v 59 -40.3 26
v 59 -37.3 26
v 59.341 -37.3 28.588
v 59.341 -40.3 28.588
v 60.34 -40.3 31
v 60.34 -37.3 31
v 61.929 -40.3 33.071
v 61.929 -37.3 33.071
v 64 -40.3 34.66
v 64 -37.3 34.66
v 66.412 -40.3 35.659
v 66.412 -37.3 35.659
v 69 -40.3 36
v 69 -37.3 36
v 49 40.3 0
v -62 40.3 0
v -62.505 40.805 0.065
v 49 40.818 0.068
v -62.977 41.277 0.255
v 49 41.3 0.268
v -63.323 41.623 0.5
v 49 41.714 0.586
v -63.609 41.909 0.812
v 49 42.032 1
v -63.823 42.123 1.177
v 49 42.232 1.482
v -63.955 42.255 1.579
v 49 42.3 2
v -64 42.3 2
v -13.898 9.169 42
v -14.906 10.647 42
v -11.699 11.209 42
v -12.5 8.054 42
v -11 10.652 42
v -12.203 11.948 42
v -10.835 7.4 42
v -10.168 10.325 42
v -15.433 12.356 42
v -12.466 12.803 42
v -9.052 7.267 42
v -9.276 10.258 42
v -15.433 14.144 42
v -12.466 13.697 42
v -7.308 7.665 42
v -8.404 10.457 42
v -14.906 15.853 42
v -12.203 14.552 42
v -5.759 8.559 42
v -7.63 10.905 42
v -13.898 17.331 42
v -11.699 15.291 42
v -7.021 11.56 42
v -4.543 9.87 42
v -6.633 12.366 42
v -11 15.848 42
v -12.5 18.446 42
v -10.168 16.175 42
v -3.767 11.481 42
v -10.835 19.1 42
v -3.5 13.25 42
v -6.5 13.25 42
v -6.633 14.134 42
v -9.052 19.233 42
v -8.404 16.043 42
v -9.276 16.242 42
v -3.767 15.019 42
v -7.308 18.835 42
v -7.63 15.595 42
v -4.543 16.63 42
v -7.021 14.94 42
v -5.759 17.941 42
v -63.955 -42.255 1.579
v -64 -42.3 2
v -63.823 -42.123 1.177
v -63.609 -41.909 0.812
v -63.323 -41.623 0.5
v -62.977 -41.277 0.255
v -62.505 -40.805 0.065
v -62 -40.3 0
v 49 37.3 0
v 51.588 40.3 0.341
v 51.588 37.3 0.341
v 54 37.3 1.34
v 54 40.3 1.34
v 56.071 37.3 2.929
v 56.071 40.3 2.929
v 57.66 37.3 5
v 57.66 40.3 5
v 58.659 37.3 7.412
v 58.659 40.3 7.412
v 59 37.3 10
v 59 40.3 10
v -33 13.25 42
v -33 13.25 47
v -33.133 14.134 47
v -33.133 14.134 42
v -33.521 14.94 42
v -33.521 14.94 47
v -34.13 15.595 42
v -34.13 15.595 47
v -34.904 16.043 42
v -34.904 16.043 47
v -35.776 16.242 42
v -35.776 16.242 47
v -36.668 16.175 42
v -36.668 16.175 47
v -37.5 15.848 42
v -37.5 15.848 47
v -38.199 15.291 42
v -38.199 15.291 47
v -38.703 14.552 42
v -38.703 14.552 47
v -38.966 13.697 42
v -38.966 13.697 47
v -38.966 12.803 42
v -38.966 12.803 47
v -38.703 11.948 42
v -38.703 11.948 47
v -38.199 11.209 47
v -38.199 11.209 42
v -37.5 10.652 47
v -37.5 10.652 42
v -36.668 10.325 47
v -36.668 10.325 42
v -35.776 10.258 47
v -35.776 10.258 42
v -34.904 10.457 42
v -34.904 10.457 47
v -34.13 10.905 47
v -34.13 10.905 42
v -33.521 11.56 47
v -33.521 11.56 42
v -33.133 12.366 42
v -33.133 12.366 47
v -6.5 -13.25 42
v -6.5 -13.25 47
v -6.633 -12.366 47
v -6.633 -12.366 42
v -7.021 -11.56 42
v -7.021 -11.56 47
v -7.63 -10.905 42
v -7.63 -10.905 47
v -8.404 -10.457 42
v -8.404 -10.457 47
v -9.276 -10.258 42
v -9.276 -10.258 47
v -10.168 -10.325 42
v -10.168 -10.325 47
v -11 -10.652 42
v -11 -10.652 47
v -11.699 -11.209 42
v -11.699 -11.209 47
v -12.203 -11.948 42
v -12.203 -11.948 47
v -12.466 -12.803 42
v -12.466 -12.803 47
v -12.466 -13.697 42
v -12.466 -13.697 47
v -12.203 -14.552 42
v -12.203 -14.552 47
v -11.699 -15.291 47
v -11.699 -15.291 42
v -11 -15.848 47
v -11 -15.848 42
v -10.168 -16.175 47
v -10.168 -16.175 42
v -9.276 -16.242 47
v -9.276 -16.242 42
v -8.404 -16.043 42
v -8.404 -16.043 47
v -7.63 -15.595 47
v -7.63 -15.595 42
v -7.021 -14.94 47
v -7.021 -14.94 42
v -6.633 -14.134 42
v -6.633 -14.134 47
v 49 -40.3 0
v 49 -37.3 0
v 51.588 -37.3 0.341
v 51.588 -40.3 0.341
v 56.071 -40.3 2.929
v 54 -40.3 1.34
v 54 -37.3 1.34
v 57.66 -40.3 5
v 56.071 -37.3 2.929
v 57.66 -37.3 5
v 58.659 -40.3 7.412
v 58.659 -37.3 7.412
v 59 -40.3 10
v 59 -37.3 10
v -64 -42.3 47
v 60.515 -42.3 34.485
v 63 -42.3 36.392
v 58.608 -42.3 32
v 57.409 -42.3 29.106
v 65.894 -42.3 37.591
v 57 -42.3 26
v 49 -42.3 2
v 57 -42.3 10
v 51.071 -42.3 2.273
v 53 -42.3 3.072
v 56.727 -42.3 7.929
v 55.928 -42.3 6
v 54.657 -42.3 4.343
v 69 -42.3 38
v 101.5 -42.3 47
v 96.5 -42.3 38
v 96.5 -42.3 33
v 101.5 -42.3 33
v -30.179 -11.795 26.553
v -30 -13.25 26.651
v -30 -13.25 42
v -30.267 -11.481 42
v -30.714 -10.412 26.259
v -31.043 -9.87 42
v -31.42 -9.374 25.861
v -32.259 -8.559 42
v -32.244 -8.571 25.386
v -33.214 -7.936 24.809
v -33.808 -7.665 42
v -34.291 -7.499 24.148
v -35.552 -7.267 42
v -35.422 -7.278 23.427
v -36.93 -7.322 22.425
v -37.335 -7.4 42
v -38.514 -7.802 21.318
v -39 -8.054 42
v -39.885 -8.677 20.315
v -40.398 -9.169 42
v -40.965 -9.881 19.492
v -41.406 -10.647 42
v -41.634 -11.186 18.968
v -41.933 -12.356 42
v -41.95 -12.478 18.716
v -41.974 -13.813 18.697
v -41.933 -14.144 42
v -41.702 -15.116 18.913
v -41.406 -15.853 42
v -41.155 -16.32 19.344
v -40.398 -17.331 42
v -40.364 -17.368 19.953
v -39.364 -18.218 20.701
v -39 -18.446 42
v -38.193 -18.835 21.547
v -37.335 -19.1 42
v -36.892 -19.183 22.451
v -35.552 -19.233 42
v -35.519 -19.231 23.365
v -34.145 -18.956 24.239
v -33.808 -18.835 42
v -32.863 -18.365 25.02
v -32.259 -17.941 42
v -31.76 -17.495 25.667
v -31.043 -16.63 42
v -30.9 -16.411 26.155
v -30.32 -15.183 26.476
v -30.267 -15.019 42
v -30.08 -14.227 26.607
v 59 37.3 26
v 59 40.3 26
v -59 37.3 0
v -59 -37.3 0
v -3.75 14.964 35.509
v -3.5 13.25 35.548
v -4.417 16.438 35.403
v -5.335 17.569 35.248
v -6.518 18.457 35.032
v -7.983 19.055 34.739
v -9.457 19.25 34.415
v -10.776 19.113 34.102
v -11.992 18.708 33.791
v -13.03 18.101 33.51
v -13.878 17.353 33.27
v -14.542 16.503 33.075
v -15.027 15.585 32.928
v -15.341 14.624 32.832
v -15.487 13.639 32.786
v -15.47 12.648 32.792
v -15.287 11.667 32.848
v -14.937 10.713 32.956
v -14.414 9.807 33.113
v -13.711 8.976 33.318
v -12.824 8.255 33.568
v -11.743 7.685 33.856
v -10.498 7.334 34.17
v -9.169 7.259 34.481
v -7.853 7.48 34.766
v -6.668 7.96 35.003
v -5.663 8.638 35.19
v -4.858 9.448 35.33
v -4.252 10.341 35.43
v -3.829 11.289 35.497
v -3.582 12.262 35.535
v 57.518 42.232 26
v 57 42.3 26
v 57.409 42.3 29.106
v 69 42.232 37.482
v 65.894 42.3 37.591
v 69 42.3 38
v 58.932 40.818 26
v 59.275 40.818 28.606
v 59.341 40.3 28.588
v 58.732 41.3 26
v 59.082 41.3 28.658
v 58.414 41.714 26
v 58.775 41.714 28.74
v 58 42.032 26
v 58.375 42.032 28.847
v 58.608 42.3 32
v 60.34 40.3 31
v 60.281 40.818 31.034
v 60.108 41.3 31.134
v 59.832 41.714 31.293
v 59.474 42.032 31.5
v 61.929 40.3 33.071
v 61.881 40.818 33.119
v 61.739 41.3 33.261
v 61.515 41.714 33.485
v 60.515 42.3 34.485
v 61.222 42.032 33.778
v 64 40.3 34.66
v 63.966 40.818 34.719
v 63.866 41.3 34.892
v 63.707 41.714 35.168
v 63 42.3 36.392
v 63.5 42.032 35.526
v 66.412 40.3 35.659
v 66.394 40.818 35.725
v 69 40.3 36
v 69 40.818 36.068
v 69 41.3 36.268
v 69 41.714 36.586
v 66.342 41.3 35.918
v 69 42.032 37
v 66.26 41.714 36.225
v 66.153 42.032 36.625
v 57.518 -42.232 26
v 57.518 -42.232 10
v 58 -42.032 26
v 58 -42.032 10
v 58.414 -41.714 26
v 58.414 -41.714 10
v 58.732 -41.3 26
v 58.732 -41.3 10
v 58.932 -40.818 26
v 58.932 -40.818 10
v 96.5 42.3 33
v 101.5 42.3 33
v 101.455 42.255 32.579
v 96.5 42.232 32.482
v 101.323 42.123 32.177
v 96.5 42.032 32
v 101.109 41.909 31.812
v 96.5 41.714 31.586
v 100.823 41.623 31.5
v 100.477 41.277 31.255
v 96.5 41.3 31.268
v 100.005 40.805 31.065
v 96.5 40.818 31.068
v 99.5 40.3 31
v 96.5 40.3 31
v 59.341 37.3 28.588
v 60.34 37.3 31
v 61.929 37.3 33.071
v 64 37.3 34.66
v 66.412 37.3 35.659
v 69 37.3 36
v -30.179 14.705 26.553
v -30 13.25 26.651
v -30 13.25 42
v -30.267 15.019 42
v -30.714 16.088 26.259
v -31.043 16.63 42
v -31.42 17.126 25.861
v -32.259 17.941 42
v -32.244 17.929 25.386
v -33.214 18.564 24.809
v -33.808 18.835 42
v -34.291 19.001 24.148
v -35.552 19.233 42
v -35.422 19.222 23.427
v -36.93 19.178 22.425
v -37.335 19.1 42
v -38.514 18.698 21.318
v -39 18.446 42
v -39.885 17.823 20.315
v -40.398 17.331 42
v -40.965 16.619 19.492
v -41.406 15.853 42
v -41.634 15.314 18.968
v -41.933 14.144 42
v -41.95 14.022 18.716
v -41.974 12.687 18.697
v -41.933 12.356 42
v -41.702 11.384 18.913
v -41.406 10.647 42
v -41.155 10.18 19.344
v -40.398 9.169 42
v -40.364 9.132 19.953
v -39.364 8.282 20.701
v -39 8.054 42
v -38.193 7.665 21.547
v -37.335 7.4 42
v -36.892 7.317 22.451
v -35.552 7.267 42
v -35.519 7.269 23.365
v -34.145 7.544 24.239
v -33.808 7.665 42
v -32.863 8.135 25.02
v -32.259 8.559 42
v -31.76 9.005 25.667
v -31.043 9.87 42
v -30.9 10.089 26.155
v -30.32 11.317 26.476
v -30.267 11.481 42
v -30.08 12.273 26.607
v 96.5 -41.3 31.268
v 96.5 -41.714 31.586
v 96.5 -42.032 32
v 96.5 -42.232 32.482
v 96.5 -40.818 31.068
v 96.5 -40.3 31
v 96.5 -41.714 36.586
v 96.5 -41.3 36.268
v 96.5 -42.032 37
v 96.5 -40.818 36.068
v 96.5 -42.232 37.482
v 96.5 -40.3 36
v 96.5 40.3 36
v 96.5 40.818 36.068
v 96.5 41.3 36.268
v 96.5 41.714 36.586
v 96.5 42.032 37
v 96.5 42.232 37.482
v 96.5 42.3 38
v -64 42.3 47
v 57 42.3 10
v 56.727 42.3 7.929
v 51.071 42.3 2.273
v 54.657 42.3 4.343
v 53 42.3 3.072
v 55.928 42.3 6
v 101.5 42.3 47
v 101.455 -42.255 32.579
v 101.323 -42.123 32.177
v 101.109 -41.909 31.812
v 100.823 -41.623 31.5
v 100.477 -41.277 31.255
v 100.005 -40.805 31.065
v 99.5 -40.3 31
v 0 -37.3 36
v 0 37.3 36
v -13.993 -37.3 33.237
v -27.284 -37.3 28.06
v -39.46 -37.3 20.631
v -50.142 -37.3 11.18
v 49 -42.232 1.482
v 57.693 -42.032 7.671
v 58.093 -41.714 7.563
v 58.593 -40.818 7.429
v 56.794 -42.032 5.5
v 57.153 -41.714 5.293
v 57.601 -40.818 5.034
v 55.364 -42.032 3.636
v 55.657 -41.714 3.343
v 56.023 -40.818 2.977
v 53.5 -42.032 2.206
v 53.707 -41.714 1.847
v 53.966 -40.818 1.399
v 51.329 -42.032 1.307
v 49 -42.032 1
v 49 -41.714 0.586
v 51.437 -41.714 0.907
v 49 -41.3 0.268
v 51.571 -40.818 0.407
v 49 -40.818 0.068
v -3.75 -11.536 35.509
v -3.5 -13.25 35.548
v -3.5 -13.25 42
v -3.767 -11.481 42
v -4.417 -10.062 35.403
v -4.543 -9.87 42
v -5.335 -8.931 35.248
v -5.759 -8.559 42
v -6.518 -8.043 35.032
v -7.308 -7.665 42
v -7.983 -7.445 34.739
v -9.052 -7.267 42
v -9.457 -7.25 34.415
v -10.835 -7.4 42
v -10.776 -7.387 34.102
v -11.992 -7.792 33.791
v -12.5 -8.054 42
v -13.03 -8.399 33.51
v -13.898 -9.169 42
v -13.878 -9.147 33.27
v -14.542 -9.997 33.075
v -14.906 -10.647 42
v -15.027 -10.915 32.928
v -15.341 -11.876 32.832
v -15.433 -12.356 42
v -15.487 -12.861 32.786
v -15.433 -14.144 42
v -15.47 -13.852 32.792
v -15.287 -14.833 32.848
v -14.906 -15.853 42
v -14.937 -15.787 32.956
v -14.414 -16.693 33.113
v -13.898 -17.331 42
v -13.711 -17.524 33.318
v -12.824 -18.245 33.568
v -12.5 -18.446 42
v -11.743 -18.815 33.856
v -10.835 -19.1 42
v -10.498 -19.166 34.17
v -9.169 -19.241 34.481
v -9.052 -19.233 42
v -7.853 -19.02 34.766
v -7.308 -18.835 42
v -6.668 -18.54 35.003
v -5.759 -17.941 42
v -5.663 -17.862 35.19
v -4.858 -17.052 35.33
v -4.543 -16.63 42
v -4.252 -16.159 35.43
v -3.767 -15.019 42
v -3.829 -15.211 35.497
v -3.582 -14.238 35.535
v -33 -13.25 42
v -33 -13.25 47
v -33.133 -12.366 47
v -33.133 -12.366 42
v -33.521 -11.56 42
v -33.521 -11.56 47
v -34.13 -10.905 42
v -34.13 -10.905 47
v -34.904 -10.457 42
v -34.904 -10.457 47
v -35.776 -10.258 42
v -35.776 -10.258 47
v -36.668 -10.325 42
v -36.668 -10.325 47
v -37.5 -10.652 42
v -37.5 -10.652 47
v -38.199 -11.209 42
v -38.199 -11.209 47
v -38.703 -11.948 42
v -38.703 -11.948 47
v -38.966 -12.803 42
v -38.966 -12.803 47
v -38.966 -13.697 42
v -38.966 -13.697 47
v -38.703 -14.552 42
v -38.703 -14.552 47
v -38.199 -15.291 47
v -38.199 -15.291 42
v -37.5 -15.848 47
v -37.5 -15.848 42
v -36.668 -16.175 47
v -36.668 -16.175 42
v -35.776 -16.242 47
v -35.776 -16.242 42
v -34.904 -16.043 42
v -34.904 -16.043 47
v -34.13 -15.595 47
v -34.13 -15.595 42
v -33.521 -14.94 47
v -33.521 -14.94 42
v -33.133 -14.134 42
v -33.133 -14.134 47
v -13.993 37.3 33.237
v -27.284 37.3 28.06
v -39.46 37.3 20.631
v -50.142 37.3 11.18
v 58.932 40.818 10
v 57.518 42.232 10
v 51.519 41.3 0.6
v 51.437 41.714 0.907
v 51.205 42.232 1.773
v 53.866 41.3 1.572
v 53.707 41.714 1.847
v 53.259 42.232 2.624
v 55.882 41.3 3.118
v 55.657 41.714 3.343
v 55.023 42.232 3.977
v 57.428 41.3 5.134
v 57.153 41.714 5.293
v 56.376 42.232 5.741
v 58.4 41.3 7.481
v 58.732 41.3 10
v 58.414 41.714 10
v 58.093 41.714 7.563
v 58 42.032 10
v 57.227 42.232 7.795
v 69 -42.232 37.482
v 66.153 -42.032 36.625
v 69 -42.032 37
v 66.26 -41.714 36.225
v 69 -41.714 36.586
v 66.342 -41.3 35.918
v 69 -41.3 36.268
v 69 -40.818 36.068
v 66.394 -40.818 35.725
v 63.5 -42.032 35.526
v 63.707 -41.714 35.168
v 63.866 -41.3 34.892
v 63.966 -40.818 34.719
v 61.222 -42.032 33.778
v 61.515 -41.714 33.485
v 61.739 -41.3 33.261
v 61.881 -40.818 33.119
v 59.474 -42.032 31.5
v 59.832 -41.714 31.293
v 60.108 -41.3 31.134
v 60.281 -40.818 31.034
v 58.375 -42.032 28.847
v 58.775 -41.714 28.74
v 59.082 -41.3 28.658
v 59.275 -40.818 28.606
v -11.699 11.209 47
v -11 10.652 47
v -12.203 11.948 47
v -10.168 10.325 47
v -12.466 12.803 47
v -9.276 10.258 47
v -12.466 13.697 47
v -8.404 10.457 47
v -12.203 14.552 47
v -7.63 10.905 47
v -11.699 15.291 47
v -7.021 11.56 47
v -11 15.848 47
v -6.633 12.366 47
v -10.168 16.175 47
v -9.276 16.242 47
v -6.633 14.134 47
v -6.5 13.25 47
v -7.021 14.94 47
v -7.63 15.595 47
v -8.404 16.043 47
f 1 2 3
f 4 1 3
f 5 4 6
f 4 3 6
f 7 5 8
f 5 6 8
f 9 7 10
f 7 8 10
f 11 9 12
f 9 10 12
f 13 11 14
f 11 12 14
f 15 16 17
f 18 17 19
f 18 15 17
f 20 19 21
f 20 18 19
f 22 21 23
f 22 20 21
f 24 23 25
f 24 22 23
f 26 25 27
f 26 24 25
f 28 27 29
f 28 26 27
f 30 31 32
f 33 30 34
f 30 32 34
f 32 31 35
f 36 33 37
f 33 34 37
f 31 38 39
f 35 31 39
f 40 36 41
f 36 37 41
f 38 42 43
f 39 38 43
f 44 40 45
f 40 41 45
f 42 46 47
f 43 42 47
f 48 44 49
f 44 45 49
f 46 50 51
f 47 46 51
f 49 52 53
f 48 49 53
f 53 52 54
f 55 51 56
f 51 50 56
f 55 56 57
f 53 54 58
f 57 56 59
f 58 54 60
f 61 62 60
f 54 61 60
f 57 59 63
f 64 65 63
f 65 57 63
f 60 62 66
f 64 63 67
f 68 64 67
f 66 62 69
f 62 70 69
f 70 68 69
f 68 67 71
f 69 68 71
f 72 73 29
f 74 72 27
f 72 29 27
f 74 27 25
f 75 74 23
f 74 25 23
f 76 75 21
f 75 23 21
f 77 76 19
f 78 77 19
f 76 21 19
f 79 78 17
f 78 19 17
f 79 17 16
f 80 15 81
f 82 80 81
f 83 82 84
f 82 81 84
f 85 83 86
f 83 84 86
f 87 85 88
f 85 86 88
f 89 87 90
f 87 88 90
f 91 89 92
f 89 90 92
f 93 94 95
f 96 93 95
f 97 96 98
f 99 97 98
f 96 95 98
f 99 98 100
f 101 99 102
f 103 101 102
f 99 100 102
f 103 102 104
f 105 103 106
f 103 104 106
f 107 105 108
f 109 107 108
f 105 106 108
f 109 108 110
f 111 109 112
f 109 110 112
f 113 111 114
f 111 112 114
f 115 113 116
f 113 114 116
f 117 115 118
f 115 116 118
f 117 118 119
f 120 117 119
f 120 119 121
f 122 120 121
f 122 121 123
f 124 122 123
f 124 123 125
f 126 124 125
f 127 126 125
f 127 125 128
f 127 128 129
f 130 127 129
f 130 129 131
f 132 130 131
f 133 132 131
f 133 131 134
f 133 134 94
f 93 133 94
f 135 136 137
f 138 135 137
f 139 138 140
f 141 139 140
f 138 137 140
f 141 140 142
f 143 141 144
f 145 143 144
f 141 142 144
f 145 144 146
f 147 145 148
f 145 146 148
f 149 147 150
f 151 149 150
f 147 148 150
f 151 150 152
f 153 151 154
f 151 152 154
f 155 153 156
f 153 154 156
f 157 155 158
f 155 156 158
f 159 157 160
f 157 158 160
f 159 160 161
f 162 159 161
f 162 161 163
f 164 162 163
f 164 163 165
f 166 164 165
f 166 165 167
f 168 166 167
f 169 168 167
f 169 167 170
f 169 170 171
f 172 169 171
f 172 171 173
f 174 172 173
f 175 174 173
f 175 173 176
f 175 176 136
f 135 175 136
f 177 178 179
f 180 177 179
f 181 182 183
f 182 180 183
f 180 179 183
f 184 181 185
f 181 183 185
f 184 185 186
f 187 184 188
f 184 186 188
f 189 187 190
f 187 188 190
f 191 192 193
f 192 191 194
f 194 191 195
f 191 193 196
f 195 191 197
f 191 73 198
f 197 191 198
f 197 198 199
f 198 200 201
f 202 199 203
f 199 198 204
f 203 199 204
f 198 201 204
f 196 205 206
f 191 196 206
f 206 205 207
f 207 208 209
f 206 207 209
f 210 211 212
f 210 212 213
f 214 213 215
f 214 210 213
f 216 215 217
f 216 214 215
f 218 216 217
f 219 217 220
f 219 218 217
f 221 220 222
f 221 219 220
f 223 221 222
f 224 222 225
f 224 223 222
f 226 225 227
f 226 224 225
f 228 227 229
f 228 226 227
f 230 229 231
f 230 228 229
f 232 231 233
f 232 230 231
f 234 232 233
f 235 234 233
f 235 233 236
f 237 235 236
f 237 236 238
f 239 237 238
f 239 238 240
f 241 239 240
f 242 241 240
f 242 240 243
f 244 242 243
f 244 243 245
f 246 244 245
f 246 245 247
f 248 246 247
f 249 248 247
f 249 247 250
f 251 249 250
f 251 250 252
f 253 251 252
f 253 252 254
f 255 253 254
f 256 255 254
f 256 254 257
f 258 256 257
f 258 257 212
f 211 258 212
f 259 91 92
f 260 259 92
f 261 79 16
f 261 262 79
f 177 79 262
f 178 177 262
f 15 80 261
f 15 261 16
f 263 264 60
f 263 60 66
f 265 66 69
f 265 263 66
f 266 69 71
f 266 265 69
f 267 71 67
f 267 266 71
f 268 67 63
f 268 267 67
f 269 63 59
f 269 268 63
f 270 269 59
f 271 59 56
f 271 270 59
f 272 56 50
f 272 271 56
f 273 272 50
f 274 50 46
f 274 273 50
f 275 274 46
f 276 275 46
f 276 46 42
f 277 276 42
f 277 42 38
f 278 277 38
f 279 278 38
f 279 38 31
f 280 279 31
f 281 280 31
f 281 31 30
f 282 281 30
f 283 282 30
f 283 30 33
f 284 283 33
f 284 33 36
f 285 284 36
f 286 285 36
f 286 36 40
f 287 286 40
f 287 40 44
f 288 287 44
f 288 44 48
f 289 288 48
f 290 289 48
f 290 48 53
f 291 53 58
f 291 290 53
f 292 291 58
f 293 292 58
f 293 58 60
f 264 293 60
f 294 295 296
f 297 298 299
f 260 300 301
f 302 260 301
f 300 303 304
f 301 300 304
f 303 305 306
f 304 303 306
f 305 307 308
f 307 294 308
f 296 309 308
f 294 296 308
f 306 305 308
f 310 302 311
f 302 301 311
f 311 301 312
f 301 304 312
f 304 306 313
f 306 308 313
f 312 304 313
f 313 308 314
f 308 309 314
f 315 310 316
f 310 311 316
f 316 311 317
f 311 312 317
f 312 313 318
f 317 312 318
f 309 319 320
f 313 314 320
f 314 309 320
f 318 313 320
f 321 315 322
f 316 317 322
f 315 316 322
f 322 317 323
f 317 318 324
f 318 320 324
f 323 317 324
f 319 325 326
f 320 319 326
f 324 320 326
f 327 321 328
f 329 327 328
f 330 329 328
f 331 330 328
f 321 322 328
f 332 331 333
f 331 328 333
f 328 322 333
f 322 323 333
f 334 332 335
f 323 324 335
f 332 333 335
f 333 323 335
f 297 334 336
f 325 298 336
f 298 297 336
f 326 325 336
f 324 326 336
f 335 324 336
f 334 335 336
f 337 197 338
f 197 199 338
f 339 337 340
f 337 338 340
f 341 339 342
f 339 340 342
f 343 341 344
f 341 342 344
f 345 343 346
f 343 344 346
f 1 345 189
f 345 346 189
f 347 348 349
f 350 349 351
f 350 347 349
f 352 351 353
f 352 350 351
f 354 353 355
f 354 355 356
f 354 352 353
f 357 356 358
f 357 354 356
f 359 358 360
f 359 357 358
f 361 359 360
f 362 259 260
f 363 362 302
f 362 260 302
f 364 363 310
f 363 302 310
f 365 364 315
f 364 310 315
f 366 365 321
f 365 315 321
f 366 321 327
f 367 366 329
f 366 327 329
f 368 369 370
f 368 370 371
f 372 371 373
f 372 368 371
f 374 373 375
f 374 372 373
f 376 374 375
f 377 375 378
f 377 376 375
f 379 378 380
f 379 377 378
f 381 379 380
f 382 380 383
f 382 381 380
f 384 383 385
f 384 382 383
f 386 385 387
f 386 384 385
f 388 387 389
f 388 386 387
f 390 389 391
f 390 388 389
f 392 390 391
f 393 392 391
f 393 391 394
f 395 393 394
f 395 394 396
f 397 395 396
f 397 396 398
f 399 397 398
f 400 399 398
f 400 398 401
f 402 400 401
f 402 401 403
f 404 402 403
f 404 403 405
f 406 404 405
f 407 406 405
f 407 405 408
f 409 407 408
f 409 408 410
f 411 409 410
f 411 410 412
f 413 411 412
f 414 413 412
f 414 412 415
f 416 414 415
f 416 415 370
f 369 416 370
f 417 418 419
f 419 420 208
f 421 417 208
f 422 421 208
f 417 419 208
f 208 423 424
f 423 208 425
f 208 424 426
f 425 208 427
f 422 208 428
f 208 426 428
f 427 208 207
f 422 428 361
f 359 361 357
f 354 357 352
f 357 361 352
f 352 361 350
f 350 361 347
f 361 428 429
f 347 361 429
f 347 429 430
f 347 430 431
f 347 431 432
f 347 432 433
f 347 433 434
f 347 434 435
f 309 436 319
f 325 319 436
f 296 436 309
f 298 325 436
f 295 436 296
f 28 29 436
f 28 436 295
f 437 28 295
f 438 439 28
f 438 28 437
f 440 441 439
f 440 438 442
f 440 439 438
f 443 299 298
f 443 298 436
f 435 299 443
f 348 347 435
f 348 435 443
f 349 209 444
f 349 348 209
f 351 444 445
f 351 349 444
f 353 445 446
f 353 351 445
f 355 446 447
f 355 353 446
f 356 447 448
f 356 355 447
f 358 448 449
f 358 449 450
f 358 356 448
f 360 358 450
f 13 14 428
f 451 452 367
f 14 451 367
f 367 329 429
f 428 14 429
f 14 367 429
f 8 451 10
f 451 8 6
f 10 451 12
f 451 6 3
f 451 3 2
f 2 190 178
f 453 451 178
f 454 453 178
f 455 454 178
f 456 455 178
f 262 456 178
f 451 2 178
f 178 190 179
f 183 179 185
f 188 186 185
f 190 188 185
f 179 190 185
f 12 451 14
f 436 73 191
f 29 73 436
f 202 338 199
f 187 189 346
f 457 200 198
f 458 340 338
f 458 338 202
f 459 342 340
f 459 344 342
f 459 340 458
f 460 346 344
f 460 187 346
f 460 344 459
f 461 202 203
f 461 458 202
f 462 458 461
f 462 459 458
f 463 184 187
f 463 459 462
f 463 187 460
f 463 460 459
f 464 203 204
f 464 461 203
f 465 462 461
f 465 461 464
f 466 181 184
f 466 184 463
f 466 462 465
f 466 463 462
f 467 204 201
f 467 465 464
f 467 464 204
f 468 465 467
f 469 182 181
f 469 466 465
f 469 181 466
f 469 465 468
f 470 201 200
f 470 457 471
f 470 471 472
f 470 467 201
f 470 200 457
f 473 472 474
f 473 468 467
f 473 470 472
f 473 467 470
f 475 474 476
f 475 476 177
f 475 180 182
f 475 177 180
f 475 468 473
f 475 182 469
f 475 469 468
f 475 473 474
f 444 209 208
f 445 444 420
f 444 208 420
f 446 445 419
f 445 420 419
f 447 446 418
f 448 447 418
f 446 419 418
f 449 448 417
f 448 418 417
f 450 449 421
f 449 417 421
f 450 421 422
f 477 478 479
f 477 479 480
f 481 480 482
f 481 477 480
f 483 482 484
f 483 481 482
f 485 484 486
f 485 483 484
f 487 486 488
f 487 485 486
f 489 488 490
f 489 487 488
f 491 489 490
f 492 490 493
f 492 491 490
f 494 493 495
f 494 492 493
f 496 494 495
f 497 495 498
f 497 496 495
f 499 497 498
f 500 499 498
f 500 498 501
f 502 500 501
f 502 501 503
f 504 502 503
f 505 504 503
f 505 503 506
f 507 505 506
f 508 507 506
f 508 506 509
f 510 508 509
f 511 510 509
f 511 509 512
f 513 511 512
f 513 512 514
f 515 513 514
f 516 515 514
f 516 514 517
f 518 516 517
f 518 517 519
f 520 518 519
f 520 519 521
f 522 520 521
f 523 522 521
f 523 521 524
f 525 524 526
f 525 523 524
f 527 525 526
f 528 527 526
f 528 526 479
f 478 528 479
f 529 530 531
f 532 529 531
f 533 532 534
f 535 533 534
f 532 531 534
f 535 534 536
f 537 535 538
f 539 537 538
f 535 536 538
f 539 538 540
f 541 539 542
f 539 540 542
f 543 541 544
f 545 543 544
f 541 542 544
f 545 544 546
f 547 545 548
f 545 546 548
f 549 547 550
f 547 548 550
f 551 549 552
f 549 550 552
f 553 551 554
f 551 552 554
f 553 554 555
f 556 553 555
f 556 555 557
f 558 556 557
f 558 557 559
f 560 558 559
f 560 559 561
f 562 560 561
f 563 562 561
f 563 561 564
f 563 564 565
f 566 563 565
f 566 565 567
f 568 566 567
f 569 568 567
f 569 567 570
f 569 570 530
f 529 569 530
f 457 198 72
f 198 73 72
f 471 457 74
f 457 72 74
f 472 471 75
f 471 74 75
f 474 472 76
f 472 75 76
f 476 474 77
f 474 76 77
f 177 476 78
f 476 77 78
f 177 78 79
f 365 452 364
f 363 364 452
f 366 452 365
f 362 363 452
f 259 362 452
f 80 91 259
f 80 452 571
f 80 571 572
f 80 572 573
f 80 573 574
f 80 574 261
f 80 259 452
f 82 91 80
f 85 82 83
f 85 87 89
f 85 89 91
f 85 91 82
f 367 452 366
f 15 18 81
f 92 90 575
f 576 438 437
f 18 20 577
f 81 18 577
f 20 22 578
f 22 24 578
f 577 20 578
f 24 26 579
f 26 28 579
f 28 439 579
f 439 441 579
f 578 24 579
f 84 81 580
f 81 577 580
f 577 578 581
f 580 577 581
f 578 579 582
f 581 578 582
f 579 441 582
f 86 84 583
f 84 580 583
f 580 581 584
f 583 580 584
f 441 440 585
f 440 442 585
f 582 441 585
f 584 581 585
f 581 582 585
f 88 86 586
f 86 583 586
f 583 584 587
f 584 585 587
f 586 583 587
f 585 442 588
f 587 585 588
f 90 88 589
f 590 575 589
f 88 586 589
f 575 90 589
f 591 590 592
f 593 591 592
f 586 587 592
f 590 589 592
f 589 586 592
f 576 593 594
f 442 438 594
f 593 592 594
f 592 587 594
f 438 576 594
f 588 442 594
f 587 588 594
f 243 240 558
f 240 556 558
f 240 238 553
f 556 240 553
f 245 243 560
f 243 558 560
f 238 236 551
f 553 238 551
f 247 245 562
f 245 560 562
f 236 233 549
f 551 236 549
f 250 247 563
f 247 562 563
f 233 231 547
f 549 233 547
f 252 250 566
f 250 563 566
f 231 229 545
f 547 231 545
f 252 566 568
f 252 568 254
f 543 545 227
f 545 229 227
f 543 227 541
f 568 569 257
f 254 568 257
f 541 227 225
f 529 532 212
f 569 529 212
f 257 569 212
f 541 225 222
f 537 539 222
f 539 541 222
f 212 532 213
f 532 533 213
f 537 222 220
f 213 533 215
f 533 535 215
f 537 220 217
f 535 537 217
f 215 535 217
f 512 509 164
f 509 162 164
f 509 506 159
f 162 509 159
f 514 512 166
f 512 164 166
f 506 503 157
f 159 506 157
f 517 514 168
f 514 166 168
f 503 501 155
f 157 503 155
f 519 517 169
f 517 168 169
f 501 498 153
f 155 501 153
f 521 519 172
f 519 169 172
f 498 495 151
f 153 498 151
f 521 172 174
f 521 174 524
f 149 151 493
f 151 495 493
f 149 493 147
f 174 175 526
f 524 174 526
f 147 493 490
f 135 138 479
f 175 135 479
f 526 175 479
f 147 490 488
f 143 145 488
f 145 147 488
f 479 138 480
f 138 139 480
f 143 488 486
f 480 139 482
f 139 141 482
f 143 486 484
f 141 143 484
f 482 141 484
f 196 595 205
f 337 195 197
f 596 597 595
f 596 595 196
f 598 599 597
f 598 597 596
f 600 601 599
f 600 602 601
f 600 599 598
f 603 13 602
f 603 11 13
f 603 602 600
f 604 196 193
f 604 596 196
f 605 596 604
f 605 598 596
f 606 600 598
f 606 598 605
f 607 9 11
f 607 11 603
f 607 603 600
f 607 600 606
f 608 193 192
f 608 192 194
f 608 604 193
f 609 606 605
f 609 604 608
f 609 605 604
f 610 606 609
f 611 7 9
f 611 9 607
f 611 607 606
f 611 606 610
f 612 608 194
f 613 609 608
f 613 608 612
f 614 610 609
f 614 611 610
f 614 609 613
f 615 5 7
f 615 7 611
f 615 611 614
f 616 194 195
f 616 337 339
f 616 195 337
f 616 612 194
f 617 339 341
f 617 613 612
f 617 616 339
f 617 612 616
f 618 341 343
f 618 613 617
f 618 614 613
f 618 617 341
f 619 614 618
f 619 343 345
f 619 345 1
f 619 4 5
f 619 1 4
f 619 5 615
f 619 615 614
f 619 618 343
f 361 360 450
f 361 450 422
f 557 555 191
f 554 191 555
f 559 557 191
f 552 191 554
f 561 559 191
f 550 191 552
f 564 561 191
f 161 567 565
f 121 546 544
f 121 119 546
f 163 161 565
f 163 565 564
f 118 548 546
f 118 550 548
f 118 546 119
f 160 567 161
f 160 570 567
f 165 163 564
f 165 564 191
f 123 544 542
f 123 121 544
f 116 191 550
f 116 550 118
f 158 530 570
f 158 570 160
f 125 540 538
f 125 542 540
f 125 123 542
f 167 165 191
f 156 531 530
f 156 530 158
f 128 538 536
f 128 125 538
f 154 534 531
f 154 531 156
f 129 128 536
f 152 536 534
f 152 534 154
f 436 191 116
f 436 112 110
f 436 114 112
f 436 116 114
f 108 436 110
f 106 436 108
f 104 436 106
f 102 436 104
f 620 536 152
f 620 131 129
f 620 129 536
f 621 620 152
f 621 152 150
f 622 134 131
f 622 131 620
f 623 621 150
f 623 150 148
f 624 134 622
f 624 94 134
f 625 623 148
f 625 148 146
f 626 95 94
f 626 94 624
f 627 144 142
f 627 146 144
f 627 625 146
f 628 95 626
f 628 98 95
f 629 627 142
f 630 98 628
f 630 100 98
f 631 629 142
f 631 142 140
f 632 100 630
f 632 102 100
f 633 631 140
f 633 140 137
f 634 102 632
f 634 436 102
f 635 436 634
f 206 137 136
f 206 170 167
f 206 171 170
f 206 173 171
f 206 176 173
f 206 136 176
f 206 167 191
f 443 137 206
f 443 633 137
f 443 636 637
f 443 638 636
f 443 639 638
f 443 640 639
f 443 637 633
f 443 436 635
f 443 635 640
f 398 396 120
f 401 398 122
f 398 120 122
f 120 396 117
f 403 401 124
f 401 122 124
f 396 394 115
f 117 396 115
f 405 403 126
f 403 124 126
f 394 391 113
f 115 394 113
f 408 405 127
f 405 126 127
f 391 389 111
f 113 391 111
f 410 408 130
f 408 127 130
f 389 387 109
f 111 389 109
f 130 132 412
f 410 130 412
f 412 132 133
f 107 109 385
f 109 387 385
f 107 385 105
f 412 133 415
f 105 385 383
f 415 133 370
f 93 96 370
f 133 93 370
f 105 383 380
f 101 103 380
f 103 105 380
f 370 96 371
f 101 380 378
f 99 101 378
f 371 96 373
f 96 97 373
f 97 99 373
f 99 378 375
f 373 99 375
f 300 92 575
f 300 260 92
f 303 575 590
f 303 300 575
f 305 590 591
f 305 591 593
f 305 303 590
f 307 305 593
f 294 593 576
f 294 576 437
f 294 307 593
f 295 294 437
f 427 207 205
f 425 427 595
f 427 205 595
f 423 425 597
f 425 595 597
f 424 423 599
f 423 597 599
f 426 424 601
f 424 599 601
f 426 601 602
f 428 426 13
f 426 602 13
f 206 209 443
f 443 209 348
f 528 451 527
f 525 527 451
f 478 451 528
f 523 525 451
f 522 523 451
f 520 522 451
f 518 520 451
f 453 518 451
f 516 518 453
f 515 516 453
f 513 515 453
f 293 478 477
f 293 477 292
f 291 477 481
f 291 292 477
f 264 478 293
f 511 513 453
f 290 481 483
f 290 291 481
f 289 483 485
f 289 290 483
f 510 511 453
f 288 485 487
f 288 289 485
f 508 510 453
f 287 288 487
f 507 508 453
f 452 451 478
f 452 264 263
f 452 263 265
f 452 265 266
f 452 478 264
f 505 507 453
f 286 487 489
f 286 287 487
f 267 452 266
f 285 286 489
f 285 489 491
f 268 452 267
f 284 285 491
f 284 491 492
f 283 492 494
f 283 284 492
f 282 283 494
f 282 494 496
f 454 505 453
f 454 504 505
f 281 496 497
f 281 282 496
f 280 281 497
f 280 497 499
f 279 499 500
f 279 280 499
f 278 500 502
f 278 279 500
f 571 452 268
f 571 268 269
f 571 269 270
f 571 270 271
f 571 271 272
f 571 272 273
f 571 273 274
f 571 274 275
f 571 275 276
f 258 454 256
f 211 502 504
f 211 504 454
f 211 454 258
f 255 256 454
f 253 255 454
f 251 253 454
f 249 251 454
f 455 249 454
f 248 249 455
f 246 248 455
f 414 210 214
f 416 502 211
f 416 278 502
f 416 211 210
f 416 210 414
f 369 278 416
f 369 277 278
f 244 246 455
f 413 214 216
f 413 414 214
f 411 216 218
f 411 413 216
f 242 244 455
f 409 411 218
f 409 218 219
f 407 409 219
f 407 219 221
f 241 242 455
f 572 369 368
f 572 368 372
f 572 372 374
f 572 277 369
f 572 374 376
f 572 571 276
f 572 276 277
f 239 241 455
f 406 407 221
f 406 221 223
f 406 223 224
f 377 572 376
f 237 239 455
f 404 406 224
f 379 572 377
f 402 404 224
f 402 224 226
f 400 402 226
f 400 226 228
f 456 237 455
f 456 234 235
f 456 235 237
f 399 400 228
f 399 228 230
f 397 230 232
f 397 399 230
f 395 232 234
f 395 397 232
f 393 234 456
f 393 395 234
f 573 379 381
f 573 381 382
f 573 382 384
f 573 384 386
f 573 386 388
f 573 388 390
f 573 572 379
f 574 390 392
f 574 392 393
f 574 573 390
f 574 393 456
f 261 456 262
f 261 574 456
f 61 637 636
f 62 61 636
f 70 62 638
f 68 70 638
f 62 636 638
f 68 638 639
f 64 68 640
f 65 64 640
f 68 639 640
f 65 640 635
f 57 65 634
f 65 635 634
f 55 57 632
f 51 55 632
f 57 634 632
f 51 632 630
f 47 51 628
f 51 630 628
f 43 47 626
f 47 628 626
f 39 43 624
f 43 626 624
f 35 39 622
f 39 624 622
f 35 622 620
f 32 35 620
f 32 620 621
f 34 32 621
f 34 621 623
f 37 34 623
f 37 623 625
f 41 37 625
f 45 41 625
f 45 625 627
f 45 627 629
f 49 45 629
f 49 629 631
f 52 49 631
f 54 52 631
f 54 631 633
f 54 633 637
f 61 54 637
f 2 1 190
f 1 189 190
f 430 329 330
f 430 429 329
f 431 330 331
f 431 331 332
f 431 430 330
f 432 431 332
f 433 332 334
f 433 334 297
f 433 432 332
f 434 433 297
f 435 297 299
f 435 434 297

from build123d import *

# Parameters (mm, degrees)
CROQUIS1_W                 = 118
CROQUIS1_H                 = 84.6
SALIENTE_EXTRUIR1_DEPTH    = 36
CROQUIS2_W                 = 36
CROQUIS2_H                 = 74.6
CORTAR_EXTRUIR1_DEPTH      = 120
CORTAR_EXTRUIR3_DEPTH      = 110.243581047
SALIENTE_EXTRUIR2_DEPTH    = 84.6
CROQUIS8_W                 = 160.5
CROQUIS8_H                 = 84.6
SALIENTE_EXTRUIR3_DEPTH    = 5
CROQUIS9_W                 = 41
CROQUIS9_H                 = 84.6
SALIENTE_EXTRUIR4_DEPTH    = 5
CROQUIS10_W                = 5
CROQUIS10_H                = 84.6
SALIENTE_EXTRUIR5_DEPTH    = 5
REDONDEO2_R                = 10
REDONDEO3_R                = 2
REDONDEO4_R                = 2
CROQUIS18_W                = 165.5
CROQUIS18_H                = 84.6
SALIENTE_EXTRUIR9_DEPTH    = 6
CORTAR_EXTRUIR6_DEPTH      = 120.584865263
CORTAR_EXTRUIR6_DEPTH_BACK = 120.584865263
CROQUIS11_R                = 6
CROQUIS16_R                = 6
SALIENTE_EXTRUIR8_DEPTH    = 5
CROQUIS17_R                = 3
CORTAR_EXTRUIR7_DEPTH      = 120.584865302


with BuildPart() as part:
    # Croquis1 → Saliente-Extruir1 (new body)
    with BuildSketch(Plane.XY):
        Rectangle(CROQUIS1_W, CROQUIS1_H)
    extrude(amount=SALIENTE_EXTRUIR1_DEPTH)

    # Croquis2 → Cortar-Extruir1 (cut)
    with BuildSketch(Plane(origin=(59, 0, 0), x_dir=(0, 0, -1), z_dir=(1, 0, 0))):
        with Locations((-18, 0)):
            Rectangle(CROQUIS2_W, CROQUIS2_H)
    extrude(amount=-CORTAR_EXTRUIR1_DEPTH, mode=Mode.SUBTRACT)


with BuildPart() as cortar_extruir1_piece_1:
    # of the separate pieces the step leaves, piece 1, a body of its own (cortar_extruir1_pieces)
    add(part.part.solids().sort_by_distance((-59, -42.3, 0))[0])


with BuildPart() as cortar_extruir1_piece_2:
    # of the separate pieces the step leaves, piece 2, a body of its own (cortar_extruir1_pieces)
    add(part.part.solids().sort_by_distance((-59, 42.3, 0))[0])


with BuildPart() as cortar_extruir3_tool:
    # Croquis6 → Cortar-Extruir3 (new, through all)
    with BuildSketch(Plane.XZ.offset(42.3)):
        with BuildLine():
            Line((-59, 0), (-59, 36))
            Line((-59, 36), (0, 36))
            ThreePointArc((0, 36), (-33.535731191, 24.614115008), (-59, 0))
        make_face()
    extrude(amount=-CORTAR_EXTRUIR3_DEPTH)


with BuildPart() as cortar_extruir1_piece_1_1:
    add(cortar_extruir1_piece_1.part)

    # Cortar-Extruir3: cut by cortar_extruir3_tool
    add(cortar_extruir3_tool.part, mode=Mode.SUBTRACT)



with BuildPart() as cortar_extruir1_piece_2_1:
    add(cortar_extruir1_piece_2.part)

    # Cortar-Extruir3: cut by cortar_extruir3_tool
    add(cortar_extruir3_tool.part, mode=Mode.SUBTRACT)


with BuildPart() as body_3:
    # Croquis7 → Saliente-Extruir2 (new, through all)
    with BuildSketch(Plane.XZ.offset(-42.3)):
        with BuildLine():
            Line((-59, 0), (-59, 36))
            Line((-59, 36), (0, 36))
            ThreePointArc((0, 36), (-33.535731191, 24.614115008), (-59, 0))
        make_face()
    extrude(amount=SALIENTE_EXTRUIR2_DEPTH)


with BuildPart() as cortar_extruir1_piece_1_2:
    add(cortar_extruir1_piece_1_1.part)

    add(cortar_extruir1_piece_2_1.part)  # Saliente-Extruir3 merges Cortar-Extruir1 piece 2

    add(body_3.part)  # Saliente-Extruir3 merges body 3
    # Croquis8 → Saliente-Extruir3 (add)
    with BuildSketch(Plane.XY.offset(36)):
        with Locations((21.25, 0)):
            Rectangle(CROQUIS8_W, CROQUIS8_H)
    extrude(amount=SALIENTE_EXTRUIR3_DEPTH)

    # Croquis9 → Saliente-Extruir4 (add)
    with BuildSketch(Plane.ZY.offset(59)):
        with Locations((20.5, 0)):
            Rectangle(CROQUIS9_W, CROQUIS9_H)
    extrude(amount=SALIENTE_EXTRUIR4_DEPTH)

    # Croquis10 → Saliente-Extruir5 (add)
    with BuildSketch(Plane(origin=(0, 0, 36), x_dir=(-1, 0, 0), z_dir=(0, 0, -1))):
        with Locations((-99, 0)):
            Rectangle(CROQUIS10_W, CROQUIS10_H)
    extrude(amount=SALIENTE_EXTRUIR5_DEPTH)

    # Redondeo2
    redondeo2_edges = [cortar_extruir1_piece_1_2.edges().sort_by_distance(p)[0] for p in [
        (59, -39.8, 36),
        (59, -39.8, 0),
        (59, 39.8, 36),
        (59, 39.8, 0),
    ]]
    fillet(redondeo2_edges, radius=REDONDEO2_R)

    # Redondeo3
    redondeo3_edges = [cortar_extruir1_piece_1_2.edges().sort_by_distance(p)[0] for p in [
        (101.5, 0, 31),
        (99, -42.3, 31),
        (99, 42.3, 31),
    ]]
    fillet(redondeo3_edges, radius=REDONDEO3_R)

    # Redondeo4
    redondeo4_edges = [cortar_extruir1_piece_1_2.edges().sort_by_distance(p)[0] for p in [
        (-7.5, -42.3, 0),
        (-64, 0, 0),
        (82.75, 42.3, 36),
        (82.75, -42.3, 36),
        (59, -42.3, 18),
        (-7.5, 42.3, 0),
        (56.071067812, -42.3, 2.928932188),
        (59, 42.3, 18),
        (56.071067812, 42.3, 2.928932188),
        (61.928932188, -42.3, 33.071067812),
        (61.928932188, 42.3, 33.071067812),
    ]]
    fillet(redondeo4_edges, radius=REDONDEO4_R)

    # Croquis18 → Saliente-Extruir9 (add)
    with BuildSketch(Plane.XY.offset(41)):
        with Locations((18.75, 0)):
            Rectangle(CROQUIS18_W, CROQUIS18_H)
    extrude(amount=SALIENTE_EXTRUIR9_DEPTH)

    # Croquis11 → Cortar-Extruir6 (cut, two sides: drawn at the far end of the back side and taken through both)
    with BuildSketch(Plane.XY.offset(47).offset(-CORTAR_EXTRUIR6_DEPTH_BACK)):
        with Locations((-36, 13.25)):
            Circle(CROQUIS11_R)
        with Locations((-9.5, 13.25)):
            Circle(CROQUIS11_R)
        with Locations((-9.5, -13.25)):
            Circle(CROQUIS11_R)
        with Locations((-36, -13.25)):
            Circle(CROQUIS11_R)
    extrude(amount=CORTAR_EXTRUIR6_DEPTH + CORTAR_EXTRUIR6_DEPTH_BACK, mode=Mode.SUBTRACT)

    # Croquis16 → Saliente-Extruir8 (add)
    with BuildSketch(Plane.XY.offset(47)):
        with Locations((-9.5, 13.25)):
            Circle(CROQUIS16_R)
        with Locations((-36, -13.25)):
            Circle(CROQUIS16_R)
        with Locations((-9.5, -13.25)):
            Circle(CROQUIS16_R)
        with Locations((-36, 13.25)):
            Circle(CROQUIS16_R)
    extrude(amount=-SALIENTE_EXTRUIR8_DEPTH)

    # Croquis17 → Cortar-Extruir7 (cut, through all)
    with BuildSketch(Plane.XY.offset(47)):
        with Locations((-9.5, 13.25)):
            Circle(CROQUIS17_R)
        with Locations((-36, 13.25)):
            Circle(CROQUIS17_R)
        with Locations((-9.5, -13.25)):
            Circle(CROQUIS17_R)
        with Locations((-36, -13.25)):
            Circle(CROQUIS17_R)
    extrude(amount=-CORTAR_EXTRUIR7_DEPTH, mode=Mode.SUBTRACT)


solid = cortar_extruir1_piece_1_2.part
